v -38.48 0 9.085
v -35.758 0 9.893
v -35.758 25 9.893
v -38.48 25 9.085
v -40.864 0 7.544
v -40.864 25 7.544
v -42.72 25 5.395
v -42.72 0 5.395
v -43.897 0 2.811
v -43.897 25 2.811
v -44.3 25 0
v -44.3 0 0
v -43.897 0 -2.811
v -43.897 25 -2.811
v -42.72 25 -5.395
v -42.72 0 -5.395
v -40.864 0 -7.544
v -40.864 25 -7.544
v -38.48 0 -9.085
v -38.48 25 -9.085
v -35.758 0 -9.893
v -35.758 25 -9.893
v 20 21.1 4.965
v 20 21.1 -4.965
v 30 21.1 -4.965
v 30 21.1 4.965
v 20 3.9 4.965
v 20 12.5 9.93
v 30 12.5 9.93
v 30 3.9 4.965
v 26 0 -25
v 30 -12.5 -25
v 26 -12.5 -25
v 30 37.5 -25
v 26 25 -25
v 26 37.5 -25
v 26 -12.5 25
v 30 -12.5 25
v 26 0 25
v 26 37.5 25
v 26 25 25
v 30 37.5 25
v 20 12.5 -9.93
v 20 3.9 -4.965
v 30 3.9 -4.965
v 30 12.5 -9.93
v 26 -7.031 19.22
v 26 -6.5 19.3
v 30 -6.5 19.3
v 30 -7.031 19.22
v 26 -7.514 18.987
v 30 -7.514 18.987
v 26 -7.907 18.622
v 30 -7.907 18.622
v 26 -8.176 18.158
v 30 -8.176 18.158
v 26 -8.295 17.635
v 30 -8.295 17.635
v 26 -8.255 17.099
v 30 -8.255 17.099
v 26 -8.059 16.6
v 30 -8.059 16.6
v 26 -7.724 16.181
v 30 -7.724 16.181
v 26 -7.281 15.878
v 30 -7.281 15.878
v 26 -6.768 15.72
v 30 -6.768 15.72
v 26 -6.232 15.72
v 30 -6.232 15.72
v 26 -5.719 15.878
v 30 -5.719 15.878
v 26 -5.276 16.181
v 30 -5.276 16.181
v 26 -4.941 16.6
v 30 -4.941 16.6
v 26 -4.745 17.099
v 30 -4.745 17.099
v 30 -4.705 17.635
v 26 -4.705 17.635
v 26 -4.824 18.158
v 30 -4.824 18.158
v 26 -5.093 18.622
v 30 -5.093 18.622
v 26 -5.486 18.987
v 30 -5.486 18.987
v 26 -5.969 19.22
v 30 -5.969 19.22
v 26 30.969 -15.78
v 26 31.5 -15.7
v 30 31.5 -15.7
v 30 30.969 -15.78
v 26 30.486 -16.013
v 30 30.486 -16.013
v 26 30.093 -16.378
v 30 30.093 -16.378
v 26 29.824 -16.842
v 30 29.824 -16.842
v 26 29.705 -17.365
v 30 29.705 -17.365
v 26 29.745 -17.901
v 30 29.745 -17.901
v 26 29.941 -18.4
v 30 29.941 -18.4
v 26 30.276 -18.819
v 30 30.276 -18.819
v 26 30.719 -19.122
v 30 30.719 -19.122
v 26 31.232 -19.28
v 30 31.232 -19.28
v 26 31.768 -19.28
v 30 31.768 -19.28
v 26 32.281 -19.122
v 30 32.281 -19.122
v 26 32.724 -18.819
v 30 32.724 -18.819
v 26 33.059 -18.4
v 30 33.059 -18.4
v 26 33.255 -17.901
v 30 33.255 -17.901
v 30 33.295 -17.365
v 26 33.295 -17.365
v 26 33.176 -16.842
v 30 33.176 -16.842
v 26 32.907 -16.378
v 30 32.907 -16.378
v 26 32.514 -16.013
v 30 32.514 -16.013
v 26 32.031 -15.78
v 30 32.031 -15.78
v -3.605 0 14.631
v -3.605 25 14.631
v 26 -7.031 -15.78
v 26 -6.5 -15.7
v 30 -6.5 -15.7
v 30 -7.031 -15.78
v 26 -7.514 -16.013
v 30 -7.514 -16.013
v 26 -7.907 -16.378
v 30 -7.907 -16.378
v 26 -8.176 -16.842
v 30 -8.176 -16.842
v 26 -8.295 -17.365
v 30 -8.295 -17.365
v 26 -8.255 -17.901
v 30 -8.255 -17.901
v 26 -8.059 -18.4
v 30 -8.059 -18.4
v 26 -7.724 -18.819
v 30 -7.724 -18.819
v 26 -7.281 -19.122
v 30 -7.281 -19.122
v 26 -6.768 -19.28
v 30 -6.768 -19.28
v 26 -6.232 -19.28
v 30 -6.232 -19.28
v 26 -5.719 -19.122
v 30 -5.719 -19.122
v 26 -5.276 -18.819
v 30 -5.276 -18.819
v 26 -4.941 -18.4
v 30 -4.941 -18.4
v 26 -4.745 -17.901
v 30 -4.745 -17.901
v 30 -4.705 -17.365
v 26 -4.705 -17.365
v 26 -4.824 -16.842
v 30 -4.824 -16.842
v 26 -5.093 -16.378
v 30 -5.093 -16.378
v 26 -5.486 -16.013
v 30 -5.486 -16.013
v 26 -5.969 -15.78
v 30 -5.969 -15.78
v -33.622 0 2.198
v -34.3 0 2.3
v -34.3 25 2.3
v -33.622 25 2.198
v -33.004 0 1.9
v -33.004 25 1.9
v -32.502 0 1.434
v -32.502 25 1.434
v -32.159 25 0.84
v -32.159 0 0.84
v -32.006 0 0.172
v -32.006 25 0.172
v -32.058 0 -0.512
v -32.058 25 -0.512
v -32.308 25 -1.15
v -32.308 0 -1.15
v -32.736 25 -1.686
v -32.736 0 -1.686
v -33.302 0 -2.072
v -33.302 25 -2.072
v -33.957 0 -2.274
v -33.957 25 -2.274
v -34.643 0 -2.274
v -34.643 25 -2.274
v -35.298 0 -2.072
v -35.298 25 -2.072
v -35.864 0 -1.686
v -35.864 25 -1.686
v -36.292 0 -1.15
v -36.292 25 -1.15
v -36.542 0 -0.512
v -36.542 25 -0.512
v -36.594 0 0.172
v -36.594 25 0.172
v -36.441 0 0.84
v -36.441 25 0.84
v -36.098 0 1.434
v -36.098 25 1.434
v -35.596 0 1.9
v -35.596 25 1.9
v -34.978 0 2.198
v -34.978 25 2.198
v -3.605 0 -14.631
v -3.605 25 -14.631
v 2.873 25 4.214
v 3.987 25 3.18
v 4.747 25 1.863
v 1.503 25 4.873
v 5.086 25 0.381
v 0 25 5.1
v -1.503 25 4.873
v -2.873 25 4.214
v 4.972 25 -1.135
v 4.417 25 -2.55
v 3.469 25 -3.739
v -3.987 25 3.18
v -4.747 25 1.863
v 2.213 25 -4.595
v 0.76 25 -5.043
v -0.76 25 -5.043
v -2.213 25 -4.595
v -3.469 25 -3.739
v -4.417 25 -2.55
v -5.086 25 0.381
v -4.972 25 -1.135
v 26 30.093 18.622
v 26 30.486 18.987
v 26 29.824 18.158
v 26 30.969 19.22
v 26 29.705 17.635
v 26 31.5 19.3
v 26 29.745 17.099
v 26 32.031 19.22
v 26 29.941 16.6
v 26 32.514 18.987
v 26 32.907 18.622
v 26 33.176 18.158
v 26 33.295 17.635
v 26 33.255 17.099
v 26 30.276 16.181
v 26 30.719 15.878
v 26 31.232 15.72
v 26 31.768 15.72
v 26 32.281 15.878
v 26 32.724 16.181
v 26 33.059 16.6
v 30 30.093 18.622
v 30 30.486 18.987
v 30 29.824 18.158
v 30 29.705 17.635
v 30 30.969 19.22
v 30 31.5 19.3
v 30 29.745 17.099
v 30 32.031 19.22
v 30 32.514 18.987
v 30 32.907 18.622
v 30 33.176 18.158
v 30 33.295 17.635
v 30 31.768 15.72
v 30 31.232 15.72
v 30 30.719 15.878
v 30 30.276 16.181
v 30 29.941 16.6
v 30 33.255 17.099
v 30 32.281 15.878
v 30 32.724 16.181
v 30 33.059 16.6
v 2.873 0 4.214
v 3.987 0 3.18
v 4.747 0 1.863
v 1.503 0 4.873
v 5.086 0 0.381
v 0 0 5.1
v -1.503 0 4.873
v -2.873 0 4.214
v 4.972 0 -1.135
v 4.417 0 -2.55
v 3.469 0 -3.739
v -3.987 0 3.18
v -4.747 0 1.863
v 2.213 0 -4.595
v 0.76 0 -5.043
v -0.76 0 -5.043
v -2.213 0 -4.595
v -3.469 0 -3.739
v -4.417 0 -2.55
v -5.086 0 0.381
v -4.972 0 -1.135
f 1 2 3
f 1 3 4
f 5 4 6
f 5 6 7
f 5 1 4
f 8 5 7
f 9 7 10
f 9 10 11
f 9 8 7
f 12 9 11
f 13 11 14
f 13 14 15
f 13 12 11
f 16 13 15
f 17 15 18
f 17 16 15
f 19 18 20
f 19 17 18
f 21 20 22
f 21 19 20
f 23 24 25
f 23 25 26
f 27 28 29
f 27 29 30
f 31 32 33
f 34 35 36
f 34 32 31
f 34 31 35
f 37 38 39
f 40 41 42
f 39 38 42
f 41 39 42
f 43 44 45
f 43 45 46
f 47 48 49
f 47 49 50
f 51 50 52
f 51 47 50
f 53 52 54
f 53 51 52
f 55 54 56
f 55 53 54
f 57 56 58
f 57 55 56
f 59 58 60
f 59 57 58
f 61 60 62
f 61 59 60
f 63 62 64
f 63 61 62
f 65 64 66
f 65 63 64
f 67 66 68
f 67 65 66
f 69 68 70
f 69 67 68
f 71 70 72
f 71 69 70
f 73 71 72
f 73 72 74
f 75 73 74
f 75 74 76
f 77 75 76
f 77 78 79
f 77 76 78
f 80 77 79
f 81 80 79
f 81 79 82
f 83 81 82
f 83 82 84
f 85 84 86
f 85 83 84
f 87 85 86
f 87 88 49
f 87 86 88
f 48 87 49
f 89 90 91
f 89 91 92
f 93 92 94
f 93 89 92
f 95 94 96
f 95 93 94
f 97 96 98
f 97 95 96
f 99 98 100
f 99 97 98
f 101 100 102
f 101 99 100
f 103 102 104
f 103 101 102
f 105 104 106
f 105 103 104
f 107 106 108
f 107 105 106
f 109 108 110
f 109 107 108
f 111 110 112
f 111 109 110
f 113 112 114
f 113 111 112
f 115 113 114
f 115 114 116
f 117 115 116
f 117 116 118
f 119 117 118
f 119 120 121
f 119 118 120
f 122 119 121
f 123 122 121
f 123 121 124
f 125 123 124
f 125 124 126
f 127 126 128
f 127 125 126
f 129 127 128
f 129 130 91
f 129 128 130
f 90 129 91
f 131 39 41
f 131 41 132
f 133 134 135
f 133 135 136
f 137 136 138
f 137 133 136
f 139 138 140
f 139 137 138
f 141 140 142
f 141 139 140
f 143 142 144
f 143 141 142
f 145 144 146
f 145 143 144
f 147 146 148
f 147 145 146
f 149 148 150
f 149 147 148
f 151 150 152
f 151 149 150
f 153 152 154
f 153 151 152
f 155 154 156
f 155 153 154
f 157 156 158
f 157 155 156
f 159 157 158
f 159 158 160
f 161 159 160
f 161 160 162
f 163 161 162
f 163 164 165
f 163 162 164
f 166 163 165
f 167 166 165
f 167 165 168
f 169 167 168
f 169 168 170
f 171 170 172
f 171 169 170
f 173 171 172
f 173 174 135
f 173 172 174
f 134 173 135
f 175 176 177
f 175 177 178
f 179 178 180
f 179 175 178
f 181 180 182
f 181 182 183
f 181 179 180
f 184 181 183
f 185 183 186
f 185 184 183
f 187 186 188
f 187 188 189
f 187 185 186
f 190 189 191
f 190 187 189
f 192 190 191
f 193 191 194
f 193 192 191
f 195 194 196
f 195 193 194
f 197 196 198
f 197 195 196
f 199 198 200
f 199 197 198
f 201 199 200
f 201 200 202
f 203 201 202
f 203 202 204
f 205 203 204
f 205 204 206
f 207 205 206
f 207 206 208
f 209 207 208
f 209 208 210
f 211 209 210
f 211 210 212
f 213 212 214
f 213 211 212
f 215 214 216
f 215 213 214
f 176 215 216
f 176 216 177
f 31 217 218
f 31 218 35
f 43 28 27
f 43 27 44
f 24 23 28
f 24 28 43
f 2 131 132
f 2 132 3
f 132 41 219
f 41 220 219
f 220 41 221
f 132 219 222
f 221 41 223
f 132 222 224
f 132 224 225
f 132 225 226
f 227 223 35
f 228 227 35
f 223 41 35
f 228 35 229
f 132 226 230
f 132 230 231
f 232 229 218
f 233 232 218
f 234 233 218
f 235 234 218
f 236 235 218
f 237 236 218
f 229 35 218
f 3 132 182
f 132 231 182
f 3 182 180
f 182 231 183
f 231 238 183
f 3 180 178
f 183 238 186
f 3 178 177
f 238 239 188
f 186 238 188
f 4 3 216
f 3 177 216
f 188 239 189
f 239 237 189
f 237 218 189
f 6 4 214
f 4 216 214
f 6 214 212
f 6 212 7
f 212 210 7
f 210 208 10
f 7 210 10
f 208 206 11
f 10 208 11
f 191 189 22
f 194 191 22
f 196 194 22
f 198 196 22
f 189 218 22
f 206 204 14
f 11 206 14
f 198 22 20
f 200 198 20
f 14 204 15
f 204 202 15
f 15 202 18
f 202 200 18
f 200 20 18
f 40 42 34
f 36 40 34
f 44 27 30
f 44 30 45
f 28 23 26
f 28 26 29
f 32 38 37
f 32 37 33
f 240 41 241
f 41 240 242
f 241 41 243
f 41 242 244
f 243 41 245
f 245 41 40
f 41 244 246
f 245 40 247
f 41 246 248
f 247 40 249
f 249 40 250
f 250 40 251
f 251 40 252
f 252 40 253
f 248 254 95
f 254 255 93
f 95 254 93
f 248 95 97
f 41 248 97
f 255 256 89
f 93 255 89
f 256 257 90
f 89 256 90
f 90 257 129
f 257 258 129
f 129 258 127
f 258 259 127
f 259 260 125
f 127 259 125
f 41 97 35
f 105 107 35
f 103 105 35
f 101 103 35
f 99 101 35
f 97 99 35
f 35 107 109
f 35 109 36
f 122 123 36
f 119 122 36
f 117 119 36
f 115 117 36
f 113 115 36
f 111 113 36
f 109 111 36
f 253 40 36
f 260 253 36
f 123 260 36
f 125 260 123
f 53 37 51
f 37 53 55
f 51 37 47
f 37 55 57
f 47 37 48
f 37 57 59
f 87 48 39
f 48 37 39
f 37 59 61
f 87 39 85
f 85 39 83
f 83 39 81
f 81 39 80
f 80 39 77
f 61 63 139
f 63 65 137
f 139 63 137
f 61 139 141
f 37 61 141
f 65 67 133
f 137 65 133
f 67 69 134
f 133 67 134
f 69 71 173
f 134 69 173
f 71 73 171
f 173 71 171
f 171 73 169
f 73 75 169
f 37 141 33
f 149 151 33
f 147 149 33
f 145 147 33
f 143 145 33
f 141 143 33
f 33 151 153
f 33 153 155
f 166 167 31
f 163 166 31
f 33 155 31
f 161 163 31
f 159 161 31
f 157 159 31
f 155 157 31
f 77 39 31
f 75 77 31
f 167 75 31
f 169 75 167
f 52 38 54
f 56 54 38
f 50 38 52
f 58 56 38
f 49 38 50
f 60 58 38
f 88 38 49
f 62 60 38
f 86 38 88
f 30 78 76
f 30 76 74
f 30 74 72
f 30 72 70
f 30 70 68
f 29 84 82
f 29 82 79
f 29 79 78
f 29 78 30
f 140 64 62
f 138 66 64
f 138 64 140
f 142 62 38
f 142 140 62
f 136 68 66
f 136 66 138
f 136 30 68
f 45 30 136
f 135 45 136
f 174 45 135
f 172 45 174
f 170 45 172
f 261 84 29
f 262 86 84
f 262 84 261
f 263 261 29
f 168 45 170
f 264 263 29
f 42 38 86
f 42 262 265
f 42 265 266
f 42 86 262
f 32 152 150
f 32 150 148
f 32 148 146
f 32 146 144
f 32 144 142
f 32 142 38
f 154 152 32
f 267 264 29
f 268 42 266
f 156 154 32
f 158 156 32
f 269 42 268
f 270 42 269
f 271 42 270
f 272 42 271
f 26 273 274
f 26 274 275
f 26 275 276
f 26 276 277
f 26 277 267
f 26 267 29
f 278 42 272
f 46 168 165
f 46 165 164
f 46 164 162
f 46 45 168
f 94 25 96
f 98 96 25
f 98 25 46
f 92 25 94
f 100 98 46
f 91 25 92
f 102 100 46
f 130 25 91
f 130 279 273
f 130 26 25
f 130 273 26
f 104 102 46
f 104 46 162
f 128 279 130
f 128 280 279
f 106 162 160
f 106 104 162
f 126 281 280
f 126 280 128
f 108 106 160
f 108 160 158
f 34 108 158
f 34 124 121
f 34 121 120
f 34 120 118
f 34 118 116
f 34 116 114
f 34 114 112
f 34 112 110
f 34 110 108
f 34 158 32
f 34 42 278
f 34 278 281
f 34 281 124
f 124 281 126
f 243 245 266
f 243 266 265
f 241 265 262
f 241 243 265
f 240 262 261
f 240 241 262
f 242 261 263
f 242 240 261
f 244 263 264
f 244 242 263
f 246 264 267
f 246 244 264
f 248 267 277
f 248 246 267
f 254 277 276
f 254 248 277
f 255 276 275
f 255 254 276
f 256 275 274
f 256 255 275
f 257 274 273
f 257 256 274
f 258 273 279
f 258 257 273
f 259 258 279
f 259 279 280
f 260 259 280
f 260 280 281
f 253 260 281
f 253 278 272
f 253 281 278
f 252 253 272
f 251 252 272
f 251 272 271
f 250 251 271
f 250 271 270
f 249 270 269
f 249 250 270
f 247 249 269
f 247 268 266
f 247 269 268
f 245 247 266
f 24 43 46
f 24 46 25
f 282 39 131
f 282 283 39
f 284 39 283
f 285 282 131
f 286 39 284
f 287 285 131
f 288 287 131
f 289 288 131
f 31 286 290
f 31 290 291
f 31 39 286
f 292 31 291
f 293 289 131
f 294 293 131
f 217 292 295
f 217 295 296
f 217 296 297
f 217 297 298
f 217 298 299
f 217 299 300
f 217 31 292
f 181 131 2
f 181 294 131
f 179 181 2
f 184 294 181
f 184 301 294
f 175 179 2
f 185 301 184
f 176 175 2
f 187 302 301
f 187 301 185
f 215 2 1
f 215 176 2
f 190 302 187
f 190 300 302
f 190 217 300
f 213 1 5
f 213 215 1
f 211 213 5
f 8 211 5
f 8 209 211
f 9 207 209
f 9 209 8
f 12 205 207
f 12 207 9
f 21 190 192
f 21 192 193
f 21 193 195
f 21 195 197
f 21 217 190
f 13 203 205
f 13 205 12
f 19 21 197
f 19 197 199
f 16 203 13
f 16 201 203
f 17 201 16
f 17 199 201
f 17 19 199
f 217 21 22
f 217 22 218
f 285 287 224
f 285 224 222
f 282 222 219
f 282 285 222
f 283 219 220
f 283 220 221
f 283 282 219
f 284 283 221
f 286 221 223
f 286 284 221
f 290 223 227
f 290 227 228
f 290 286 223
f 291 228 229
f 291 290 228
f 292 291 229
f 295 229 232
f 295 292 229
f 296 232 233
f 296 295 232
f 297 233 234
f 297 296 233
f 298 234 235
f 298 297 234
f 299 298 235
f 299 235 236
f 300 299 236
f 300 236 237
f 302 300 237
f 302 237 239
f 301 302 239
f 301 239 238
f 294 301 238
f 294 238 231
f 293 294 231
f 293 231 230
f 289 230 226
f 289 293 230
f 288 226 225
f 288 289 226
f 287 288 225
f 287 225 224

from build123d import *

# Parameters (mm, degrees)
SKETCH1_R               = 5.1
SKETCH1_R_2             = 2.3
BOSS_EXTRUDE1_DEPTH     = 25
SKETCH4_W               = 50
SKETCH4_H               = 12.5
BOSS_EXTRUDE3_DEPTH     = 4
CUT_EXTRUDE3_DEPTH      = 87.900747983
CUT_EXTRUDE3_DEPTH_BACK = 87.900747983
SKETCH5_R               = 1.8
CUT_EXTRUDE4_DEPTH      = 87.900747983
CUT_EXTRUDE4_DEPTH_BACK = 10


with BuildPart() as part:
    # Sketch1 → Boss-Extrude1 (new body)
    with BuildSketch(Plane(origin=(0, 0, 0), x_dir=(1, 0, 0), z_dir=(0, 1, 0))):
        with BuildLine():
            Line((30, 12.5), (30, -12.5))
            Line((30, -12.5), (30, -25))
            Line((30, -25), (26, -25))
            Line((26, -25), (-3.605153395, -14.630751305))
            Line((-3.605153395, -14.630751305), (-35.757725948, -9.893181241))
            ThreePointArc((-35.757725948, -9.893181241), (-44.3, 0), (-35.757725948, 9.893181241))
            Line((-35.757725948, 9.893181241), (-3.605153395, 14.630751305))
            Line((-3.605153395, 14.630751305), (26, 25))
            Line((26, 25), (30, 25))
            Line((30, 25), (30, 12.5))
        make_face()
        with Locations(Location((0, 0, 0), (0, 0, 270))):
            Circle(SKETCH1_R, mode=Mode.SUBTRACT)
        with Locations(Location((-34.3, 0, 0), (0, 0, 270))):
            Circle(SKETCH1_R_2, mode=Mode.SUBTRACT)
    extrude(amount=BOSS_EXTRUDE1_DEPTH)

    # Sketch4 → Boss-Extrude3 (add)
    with BuildSketch(Plane(origin=(30, 0, 0), x_dir=(0, 0, -1), z_dir=(1, 0, 0))):
        with Locations((0, 31.25)):
            Rectangle(SKETCH4_W, SKETCH4_H)
        with Locations((0, -6.25)):
            Rectangle(SKETCH4_W, SKETCH4_H)
    extrude(amount=-BOSS_EXTRUDE3_DEPTH)

    # Sketch5 → Cut-Extrude3 (cut, two sides: drawn at the far end of the back side and taken through both)
    with BuildSketch(Plane(origin=(30, 0, 0), x_dir=(0, 0, -1), z_dir=(1, 0, 0)).offset(-CUT_EXTRUDE3_DEPTH_BACK)):
        with Locations(Location((-17.5, 31.5, 0), (0, 0, 180))):
            Circle(SKETCH5_R)
        with Locations(Location((17.5, 31.5, 0), (0, 0, 180))):
            Circle(SKETCH5_R)
        with Locations(Location((17.5, -6.5, 0), (0, 0, 180))):
            Circle(SKETCH5_R)
        with Locations(Location((-17.5, -6.5, 0), (0, 0, 180))):
            Circle(SKETCH5_R)
    extrude(amount=CUT_EXTRUDE3_DEPTH + CUT_EXTRUDE3_DEPTH_BACK, mode=Mode.SUBTRACT)

    # Sketch3 → Cut-Extrude4 (cut, two sides: drawn at the far end of the back side and taken through both)
    with BuildSketch(Plane(origin=(30, 0, 0), x_dir=(0, 0, -1), z_dir=(1, 0, 0)).offset(-CUT_EXTRUDE4_DEPTH_BACK)):
        Polygon((-4.965212315, 21.1), (-9.93042463, 12.5), (-4.965212315, 3.9), (4.965212315, 3.9), (9.93042463, 12.5), (4.965212315, 21.1), align=None)
    extrude(amount=CUT_EXTRUDE4_DEPTH + CUT_EXTRUDE4_DEPTH_BACK, mode=Mode.SUBTRACT)


solid = part.part
